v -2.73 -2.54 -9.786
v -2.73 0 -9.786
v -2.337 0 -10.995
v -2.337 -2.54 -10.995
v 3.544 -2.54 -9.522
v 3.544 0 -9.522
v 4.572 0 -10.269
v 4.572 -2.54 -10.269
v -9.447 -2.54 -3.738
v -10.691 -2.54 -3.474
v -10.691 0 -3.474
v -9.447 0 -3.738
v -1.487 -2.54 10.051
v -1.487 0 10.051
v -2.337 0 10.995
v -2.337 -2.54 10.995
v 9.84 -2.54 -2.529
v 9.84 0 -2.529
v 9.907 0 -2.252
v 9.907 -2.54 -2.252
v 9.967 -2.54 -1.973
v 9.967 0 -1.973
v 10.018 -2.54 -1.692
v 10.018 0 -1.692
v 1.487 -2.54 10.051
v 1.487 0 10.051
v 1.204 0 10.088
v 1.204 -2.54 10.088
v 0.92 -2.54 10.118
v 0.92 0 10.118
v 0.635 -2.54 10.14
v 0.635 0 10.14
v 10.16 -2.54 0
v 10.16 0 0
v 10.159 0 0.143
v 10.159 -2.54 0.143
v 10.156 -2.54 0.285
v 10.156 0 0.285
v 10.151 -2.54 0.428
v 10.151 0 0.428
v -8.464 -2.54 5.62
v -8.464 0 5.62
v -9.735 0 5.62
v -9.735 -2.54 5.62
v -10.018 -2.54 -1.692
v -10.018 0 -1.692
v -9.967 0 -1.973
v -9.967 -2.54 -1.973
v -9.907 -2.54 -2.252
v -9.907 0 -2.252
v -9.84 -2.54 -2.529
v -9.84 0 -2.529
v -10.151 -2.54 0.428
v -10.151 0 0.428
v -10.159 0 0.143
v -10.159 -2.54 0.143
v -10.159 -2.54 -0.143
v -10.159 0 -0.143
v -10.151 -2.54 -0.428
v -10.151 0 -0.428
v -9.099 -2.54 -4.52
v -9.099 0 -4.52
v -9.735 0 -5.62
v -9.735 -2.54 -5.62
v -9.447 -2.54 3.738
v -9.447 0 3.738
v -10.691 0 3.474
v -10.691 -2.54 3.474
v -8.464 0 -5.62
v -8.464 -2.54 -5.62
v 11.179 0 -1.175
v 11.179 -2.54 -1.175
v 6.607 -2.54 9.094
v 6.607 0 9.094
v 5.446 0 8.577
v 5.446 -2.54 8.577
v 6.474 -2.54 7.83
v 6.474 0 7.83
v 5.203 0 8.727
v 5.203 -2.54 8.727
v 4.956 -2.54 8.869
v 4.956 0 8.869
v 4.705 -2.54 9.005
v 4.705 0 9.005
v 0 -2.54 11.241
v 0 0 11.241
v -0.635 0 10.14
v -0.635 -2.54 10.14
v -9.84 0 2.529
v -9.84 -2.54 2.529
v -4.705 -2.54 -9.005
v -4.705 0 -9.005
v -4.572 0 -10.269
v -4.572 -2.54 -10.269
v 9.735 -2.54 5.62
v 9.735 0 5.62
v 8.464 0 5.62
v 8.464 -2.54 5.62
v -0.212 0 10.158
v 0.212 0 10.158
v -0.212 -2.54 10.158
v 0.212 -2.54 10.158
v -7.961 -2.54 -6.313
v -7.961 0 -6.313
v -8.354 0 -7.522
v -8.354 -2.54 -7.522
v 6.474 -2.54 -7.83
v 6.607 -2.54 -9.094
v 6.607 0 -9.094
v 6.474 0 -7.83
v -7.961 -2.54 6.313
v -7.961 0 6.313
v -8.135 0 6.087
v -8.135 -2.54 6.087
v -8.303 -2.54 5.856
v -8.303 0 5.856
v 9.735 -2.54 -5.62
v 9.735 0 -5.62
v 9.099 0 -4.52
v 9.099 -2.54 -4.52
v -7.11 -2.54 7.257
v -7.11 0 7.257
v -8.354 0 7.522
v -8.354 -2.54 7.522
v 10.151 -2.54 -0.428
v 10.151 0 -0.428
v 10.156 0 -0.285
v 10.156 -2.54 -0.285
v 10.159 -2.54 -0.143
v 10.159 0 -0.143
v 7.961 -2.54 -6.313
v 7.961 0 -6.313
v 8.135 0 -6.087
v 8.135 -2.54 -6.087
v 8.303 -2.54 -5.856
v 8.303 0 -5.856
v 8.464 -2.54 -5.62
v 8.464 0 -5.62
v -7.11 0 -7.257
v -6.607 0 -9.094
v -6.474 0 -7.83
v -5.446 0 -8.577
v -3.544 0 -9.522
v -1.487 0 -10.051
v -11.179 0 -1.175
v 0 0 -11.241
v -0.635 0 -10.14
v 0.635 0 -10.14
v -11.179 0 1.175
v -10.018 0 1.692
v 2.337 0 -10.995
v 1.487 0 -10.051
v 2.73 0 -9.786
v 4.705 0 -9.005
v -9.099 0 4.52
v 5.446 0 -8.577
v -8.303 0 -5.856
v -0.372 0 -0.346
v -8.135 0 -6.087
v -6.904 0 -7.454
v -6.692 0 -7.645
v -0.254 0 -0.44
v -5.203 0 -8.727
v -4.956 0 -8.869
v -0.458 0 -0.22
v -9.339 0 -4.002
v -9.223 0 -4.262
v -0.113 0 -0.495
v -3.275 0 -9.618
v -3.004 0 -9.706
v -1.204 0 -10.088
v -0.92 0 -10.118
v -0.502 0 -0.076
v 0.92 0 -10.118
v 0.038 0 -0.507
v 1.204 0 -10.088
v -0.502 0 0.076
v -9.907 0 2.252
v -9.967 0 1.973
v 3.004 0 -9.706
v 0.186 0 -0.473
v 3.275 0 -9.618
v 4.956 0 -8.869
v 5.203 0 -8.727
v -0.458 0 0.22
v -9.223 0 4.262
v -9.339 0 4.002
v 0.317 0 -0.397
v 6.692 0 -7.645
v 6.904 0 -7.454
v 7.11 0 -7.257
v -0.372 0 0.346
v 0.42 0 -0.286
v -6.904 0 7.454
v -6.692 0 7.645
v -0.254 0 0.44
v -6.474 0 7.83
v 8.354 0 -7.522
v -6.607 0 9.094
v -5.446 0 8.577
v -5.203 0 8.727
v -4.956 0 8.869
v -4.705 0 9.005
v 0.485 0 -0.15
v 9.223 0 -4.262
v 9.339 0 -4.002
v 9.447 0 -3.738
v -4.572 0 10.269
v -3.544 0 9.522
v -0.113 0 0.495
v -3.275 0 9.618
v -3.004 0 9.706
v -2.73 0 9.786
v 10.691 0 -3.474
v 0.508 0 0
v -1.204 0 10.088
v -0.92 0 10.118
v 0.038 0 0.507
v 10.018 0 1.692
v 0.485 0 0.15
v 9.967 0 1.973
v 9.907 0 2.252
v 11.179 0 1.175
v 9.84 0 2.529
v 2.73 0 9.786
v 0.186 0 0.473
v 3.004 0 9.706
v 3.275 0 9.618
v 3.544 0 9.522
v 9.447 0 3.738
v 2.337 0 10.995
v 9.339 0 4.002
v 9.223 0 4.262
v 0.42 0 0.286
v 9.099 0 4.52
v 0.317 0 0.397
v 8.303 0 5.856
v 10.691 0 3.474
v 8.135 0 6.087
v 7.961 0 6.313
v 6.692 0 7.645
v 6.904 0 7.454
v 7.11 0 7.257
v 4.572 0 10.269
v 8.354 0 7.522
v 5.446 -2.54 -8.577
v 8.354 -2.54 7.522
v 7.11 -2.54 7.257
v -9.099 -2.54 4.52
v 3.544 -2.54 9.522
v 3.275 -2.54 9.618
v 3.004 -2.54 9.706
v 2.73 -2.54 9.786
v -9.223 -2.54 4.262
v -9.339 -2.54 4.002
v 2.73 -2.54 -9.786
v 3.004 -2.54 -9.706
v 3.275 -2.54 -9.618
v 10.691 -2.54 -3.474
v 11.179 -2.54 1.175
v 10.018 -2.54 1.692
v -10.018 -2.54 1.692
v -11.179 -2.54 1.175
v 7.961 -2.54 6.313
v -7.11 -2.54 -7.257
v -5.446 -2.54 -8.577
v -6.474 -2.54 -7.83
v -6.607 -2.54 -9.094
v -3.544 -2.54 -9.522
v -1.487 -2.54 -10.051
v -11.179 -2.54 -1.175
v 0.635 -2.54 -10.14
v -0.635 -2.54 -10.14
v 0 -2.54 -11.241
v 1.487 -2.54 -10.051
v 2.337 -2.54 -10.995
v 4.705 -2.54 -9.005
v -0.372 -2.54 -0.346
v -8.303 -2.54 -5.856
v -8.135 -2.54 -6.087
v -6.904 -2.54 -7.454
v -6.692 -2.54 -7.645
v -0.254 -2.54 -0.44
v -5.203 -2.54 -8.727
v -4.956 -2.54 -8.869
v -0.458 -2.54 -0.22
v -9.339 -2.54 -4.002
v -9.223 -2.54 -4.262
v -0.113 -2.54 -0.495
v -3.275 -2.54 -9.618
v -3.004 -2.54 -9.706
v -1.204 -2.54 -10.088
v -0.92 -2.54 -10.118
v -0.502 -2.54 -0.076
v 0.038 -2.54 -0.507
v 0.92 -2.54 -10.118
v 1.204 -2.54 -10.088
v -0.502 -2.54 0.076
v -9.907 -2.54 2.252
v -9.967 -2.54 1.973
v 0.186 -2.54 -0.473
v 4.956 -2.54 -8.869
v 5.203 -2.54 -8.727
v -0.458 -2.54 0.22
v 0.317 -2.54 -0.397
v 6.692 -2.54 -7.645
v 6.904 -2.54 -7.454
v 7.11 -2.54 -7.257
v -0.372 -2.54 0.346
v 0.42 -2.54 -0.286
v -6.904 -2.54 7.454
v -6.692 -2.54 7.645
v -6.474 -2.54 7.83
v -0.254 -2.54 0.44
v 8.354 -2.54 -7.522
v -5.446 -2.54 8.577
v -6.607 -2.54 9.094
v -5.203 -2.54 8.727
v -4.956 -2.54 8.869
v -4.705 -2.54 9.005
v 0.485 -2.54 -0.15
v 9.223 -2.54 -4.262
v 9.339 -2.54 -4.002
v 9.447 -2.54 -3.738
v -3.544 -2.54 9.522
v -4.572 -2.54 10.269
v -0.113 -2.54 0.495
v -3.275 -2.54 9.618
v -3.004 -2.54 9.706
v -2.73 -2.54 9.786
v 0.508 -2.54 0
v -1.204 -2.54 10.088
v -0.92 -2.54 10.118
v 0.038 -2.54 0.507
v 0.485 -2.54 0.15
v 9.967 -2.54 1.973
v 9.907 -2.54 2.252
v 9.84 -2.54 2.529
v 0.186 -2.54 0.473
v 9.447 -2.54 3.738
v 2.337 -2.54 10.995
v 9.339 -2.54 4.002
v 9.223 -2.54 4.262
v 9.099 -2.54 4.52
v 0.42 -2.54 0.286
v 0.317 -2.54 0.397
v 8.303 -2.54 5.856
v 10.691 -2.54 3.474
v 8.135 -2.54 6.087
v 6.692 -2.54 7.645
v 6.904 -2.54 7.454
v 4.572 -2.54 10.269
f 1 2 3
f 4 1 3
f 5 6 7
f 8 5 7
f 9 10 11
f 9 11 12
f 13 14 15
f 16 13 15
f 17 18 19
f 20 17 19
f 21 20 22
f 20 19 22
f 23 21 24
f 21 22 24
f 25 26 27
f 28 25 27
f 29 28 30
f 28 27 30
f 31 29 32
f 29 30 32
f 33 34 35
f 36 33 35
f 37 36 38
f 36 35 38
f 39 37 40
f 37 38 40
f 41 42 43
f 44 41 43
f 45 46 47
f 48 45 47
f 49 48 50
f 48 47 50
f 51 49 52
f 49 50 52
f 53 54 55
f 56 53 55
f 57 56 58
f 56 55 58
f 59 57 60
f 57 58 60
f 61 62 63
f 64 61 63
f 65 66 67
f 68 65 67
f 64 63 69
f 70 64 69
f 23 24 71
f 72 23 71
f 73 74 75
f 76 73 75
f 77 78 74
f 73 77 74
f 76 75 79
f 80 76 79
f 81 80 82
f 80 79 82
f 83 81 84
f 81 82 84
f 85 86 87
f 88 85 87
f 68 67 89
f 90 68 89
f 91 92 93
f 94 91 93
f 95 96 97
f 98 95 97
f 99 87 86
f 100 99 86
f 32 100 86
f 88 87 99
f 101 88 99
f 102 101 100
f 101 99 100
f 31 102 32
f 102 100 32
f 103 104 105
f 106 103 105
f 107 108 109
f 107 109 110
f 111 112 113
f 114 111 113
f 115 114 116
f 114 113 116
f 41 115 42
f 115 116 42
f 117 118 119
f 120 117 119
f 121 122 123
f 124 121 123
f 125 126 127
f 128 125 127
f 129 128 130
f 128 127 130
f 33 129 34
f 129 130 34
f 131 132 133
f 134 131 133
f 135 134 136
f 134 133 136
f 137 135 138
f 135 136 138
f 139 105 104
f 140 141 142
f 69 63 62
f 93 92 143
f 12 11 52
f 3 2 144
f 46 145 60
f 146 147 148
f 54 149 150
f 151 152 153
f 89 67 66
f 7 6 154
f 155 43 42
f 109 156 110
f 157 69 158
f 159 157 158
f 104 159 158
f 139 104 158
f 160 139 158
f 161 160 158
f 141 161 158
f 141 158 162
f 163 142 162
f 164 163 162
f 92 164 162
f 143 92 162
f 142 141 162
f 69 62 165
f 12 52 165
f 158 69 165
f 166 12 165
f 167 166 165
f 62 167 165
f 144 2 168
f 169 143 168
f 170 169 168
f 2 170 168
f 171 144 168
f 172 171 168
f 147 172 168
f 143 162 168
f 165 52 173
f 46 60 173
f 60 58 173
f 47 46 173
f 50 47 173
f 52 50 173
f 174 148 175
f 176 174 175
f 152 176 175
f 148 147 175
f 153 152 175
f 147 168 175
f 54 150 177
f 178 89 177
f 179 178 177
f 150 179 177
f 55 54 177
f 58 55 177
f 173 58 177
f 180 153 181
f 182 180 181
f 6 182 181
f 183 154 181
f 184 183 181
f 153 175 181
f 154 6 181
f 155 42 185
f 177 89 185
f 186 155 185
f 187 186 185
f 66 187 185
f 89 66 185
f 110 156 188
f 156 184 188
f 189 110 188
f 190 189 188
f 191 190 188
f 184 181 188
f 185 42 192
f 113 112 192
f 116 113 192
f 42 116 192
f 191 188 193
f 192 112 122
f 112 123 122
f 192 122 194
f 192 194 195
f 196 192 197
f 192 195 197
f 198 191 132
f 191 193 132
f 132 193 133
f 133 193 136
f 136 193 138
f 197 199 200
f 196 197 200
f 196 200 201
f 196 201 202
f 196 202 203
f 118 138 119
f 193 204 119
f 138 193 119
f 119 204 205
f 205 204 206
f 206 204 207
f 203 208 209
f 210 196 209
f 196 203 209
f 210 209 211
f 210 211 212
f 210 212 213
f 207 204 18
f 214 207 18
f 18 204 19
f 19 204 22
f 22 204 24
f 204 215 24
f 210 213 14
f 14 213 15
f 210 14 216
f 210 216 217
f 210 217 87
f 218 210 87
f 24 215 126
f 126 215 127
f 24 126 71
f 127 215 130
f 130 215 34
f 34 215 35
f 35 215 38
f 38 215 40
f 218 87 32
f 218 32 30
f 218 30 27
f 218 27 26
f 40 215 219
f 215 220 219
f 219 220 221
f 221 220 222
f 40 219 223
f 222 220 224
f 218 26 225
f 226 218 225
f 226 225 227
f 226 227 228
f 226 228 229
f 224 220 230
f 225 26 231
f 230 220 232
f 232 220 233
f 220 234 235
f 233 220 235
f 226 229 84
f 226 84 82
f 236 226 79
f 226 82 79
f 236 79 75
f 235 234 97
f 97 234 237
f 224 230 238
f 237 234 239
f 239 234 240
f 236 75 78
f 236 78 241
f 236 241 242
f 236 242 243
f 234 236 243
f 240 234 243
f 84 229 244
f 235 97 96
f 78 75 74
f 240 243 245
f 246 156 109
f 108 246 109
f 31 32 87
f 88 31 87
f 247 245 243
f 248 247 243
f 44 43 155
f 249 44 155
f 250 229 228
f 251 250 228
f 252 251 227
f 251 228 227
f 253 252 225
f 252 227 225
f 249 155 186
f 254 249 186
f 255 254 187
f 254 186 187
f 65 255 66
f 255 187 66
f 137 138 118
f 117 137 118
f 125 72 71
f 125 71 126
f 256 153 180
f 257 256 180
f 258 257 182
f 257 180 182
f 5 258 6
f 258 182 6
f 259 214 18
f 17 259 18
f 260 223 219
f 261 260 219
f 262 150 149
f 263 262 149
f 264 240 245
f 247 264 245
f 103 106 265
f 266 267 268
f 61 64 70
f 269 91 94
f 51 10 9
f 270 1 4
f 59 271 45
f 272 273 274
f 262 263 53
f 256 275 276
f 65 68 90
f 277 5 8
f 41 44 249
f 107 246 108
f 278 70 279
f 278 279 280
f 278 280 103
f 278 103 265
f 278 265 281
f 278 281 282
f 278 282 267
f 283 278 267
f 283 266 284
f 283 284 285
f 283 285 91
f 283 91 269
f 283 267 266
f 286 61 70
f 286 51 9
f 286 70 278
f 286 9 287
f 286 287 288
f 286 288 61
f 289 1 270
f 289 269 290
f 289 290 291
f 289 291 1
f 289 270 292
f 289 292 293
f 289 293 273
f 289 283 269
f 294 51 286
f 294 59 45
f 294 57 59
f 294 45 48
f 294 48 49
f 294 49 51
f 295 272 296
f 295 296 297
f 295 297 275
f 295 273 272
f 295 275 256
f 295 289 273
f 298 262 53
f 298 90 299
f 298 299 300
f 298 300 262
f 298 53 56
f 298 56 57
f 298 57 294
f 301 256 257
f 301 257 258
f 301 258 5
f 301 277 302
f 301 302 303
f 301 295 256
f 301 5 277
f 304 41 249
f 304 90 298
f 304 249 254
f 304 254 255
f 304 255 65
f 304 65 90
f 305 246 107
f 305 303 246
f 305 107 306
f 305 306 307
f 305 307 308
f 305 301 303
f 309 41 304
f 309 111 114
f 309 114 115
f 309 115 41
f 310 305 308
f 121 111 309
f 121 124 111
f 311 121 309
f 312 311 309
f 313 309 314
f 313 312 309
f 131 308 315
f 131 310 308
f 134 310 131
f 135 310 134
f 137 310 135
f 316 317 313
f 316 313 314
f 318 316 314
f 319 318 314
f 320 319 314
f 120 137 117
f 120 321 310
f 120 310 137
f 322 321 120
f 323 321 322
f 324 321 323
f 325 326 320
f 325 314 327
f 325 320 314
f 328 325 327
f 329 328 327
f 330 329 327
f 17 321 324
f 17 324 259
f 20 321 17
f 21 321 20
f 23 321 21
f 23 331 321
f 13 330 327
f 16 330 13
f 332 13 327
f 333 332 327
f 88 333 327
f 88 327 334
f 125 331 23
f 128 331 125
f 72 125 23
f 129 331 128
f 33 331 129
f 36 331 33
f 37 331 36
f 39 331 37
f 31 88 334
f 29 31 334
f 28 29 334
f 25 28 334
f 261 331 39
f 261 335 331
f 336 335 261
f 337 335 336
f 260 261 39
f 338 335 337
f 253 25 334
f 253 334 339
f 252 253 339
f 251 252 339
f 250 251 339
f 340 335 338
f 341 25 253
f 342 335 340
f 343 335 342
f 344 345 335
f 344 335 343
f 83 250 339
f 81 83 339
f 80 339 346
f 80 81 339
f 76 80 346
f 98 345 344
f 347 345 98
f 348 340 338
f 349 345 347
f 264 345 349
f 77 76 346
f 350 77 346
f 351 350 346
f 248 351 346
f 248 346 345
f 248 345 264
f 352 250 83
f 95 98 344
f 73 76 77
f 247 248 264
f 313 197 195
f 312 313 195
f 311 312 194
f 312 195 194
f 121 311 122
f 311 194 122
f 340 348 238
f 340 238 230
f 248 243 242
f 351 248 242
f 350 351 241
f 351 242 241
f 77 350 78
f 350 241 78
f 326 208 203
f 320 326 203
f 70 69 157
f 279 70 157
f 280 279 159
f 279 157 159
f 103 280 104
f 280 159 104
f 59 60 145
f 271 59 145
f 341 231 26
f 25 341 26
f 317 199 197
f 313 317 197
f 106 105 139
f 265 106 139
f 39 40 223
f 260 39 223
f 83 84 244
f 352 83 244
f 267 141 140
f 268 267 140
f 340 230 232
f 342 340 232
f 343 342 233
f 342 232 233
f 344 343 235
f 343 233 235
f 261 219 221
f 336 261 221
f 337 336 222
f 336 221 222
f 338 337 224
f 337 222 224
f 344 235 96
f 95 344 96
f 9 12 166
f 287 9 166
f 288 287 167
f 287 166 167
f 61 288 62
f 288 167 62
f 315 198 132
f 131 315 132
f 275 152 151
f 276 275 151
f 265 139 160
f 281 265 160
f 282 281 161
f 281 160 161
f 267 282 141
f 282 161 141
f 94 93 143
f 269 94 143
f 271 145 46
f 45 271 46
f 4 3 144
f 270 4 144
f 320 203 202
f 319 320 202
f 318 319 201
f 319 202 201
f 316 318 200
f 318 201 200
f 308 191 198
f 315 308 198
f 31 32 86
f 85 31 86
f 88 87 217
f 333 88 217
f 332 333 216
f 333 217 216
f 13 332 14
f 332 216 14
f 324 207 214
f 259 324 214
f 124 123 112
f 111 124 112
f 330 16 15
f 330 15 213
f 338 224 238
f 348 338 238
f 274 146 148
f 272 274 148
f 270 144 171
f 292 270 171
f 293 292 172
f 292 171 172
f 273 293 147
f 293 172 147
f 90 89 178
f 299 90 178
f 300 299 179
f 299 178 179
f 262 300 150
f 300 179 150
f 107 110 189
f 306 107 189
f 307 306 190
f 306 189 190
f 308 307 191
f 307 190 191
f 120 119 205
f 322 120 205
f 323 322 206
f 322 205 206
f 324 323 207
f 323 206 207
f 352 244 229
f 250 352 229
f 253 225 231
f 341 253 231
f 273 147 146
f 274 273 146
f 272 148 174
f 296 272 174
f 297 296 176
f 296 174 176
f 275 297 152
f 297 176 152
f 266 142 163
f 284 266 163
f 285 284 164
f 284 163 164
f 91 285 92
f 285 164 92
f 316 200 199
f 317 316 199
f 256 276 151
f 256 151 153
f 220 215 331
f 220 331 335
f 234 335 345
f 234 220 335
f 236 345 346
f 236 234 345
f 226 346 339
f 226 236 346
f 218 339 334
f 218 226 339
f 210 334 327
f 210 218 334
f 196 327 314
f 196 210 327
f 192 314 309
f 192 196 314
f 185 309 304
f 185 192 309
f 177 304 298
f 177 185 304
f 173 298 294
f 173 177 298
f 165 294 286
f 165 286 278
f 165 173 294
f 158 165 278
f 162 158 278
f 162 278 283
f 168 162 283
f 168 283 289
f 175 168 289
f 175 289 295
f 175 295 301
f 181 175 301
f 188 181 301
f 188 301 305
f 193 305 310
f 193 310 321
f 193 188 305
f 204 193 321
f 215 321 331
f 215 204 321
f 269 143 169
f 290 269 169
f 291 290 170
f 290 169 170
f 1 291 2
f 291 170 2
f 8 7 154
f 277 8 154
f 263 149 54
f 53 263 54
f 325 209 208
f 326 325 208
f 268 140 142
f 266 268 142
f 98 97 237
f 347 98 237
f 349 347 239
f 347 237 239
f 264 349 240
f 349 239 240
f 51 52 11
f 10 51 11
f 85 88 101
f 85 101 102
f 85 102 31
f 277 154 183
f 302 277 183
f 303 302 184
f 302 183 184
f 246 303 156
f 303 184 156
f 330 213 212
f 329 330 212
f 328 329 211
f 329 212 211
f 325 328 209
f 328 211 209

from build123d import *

# Parameters (mm, degrees)
F0_R     = 0.508
F1_DEPTH = 2.54


with BuildPart() as f1:
    # F0 (on Front) → F1 (new body)
    with BuildSketch(Plane.XZ):
        with BuildLine():
            ThreePointArc((10.150983, -0.42796), (10.157745, -0.214027), (10.16, 0))
            ThreePointArc((10.16, 0), (10.157745, 0.214027), (10.150983, 0.42796))
            ThreePointArc((10.150983, 0.42796), (10.104342, 1.062009), (10.018137, 1.6919))
            ThreePointArc((10.018137, 1.6919), (9.93798, 2.112383), (9.840182, 2.529116))
            ThreePointArc((9.840182, 2.529116), (9.662734, 3.139613), (9.447451, 3.737816))
            ThreePointArc((9.447451, 3.737816), (9.281622, 4.132444), (9.099317, 4.519737))
            ThreePointArc((9.099317, 4.519737), (8.798818, 5.08), (8.463866, 5.620371))
            ThreePointArc((8.463866, 5.620371), (8.219613, 5.971898), (7.960769, 6.312825))
            ThreePointArc((7.960769, 6.312825), (7.550351, 6.798367), (7.110369, 7.257289))
            ThreePointArc((7.110369, 7.257289), (6.798367, 7.550351), (6.474297, 7.830011))
            ThreePointArc((6.474297, 7.830011), (5.971898, 8.219613), (5.446115, 8.577029))
            ThreePointArc((5.446115, 8.577029), (5.08, 8.798818), (4.704867, 9.004989))
            ThreePointArc((4.704867, 9.004989), (4.132444, 9.281622), (3.54384, 9.521911))
            ThreePointArc((3.54384, 9.521911), (3.139613, 9.662734), (2.729812, 9.786405))
            ThreePointArc((2.729812, 9.786405), (2.112383, 9.93798), (1.486682, 10.050641))
            ThreePointArc((1.486682, 10.050641), (1.062009, 10.104342), (0.635451, 10.140109))
            Line((0.635451, 10.140109), (-0.635451, 10.140109))
            ThreePointArc((-0.635451, 10.140109), (-1.062009, 10.104342), (-1.486682, 10.050641))
            ThreePointArc((-1.486682, 10.050641), (-2.112383, 9.93798), (-2.729812, 9.786405))
            ThreePointArc((-2.729812, 9.786405), (-3.139613, 9.662734), (-3.54384, 9.521911))
            ThreePointArc((-3.54384, 9.521911), (-4.132444, 9.281622), (-4.704867, 9.004989))
            ThreePointArc((-4.704867, 9.004989), (-5.08, 8.798818), (-5.446115, 8.577029))
            ThreePointArc((-5.446115, 8.577029), (-5.971898, 8.219613), (-6.474297, 7.830011))
            ThreePointArc((-6.474297, 7.830011), (-6.798367, 7.550351), (-7.110369, 7.257289))
            ThreePointArc((-7.110369, 7.257289), (-7.550351, 6.798367), (-7.960769, 6.312825))
            ThreePointArc((-7.960769, 6.312825), (-8.219613, 5.971898), (-8.463866, 5.620371))
            ThreePointArc((-8.463866, 5.620371), (-8.798818, 5.08), (-9.099317, 4.519737))
            ThreePointArc((-9.099317, 4.519737), (-9.281622, 4.132444), (-9.447451, 3.737816))
            ThreePointArc((-9.447451, 3.737816), (-9.662734, 3.139613), (-9.840182, 2.529116))
            ThreePointArc((-9.840182, 2.529116), (-9.93798, 2.112383), (-10.018137, 1.6919))
            ThreePointArc((-10.018137, 1.6919), (-10.104342, 1.062009), (-10.150983, 0.42796))
            ThreePointArc((-10.150983, 0.42796), (-10.16, 0), (-10.150983, -0.42796))
            ThreePointArc((-10.150983, -0.42796), (-10.104342, -1.062009), (-10.018137, -1.6919))
            ThreePointArc((-10.018137, -1.6919), (-9.93798, -2.112383), (-9.840182, -2.529116))
            ThreePointArc((-9.840182, -2.529116), (-9.662734, -3.139613), (-9.447451, -3.737816))
            ThreePointArc((-9.447451, -3.737816), (-9.281622, -4.132444), (-9.099317, -4.519737))
            ThreePointArc((-9.099317, -4.519737), (-8.798818, -5.08), (-8.463866, -5.620371))
            ThreePointArc((-8.463866, -5.620371), (-8.219613, -5.971898), (-7.960769, -6.312825))
            ThreePointArc((-7.960769, -6.312825), (-7.550351, -6.798367), (-7.110369, -7.257289))
            ThreePointArc((-7.110369, -7.257289), (-6.798367, -7.550351), (-6.474297, -7.830011))
            ThreePointArc((-6.474297, -7.830011), (-5.971898, -8.219613), (-5.446115, -8.577029))
            ThreePointArc((-5.446115, -8.577029), (-5.08, -8.798818), (-4.704867, -9.004989))
            ThreePointArc((-4.704867, -9.004989), (-4.132444, -9.281622), (-3.54384, -9.521911))
            ThreePointArc((-3.54384, -9.521911), (-3.139613, -9.662734), (-2.729812, -9.786405))
            ThreePointArc((-2.729812, -9.786405), (-2.112383, -9.93798), (-1.486682, -10.050641))
            ThreePointArc((-1.486682, -10.050641), (-1.062009, -10.104342), (-0.635451, -10.140109))
            ThreePointArc((-0.635451, -10.140109), (0, -10.16), (0.635451, -10.140109))
            ThreePointArc((0.635451, -10.140109), (1.062009, -10.104342), (1.486682, -10.050641))
            ThreePointArc((1.486682, -10.050641), (2.112383, -9.93798), (2.729812, -9.786405))
            ThreePointArc((2.729812, -9.786405), (3.139613, -9.662734), (3.54384, -9.521911))
            ThreePointArc((3.54384, -9.521911), (4.132444, -9.281622), (4.704867, -9.004989))
            ThreePointArc((4.704867, -9.004989), (5.08, -8.798818), (5.446115, -8.577029))
            ThreePointArc((5.446115, -8.577029), (5.971898, -8.219613), (6.474297, -7.830011))
            ThreePointArc((6.474297, -7.830011), (6.798367, -7.550351), (7.110369, -7.257289))
            ThreePointArc((7.110369, -7.257289), (7.550351, -6.798367), (7.960769, -6.312825))
            ThreePointArc((7.960769, -6.312825), (8.219613, -5.971898), (8.463866, -5.620371))
            ThreePointArc((8.463866, -5.620371), (8.798818, -5.08), (9.099317, -4.519737))
            ThreePointArc((9.099317, -4.519737), (9.281622, -4.132444), (9.447451, -3.737816))
            ThreePointArc((9.447451, -3.737816), (9.662734, -3.139613), (9.840182, -2.529116))
            ThreePointArc((9.840182, -2.529116), (9.93798, -2.112383), (10.018137, -1.6919))
            ThreePointArc((10.018137, -1.6919), (10.104342, -1.062009), (10.150983, -0.42796))
        make_face()
        Circle(F0_R, mode=Mode.SUBTRACT)
        with BuildLine():
            ThreePointArc((-9.840182, 2.529116), (-9.662734, 3.139613), (-9.447451, 3.737816))
            Line((-9.447451, 3.737816), (-10.690581, 3.47358))
            Line((-10.690581, 3.47358), (-9.840182, 2.529116))
        make_face()
        with BuildLine():
            ThreePointArc((-9.099317, 4.519737), (-8.798818, 5.08), (-8.463866, 5.620371))
            Line((-8.463866, 5.620371), (-9.734769, 5.620371))
            Line((-9.734769, 5.620371), (-9.099317, 4.519737))
        make_face()
        with BuildLine():
            ThreePointArc((-7.960769, 6.312825), (-7.550351, 6.798367), (-7.110369, 7.257289))
            Line((-7.110369, 7.257289), (-8.3535, 7.521525))
            Line((-8.3535, 7.521525), (-7.960769, 6.312825))
        make_face()
        with BuildLine():
            ThreePointArc((-6.474297, 7.830011), (-5.971898, 8.219613), (-5.446115, 8.577029))
            Line((-5.446115, 8.577029), (-6.607143, 9.093952))
            Line((-6.607143, 9.093952), (-6.474297, 7.830011))
        make_face()
        with BuildLine():
            ThreePointArc((-4.704867, 9.004989), (-4.132444, 9.281622), (-3.54384, 9.521911))
            Line((-3.54384, 9.521911), (-4.572022, 10.268929))
            Line((-4.572022, 10.268929), (-4.704867, 9.004989))
        make_face()
        with BuildLine():
            ThreePointArc((-2.729812, 9.786405), (-2.112383, 9.93798), (-1.486682, 10.050641))
            Line((-1.486682, 10.050641), (-2.337082, 10.995105))
            Line((-2.337082, 10.995105), (-2.729812, 9.786405))
        make_face()
        with BuildLine():
            ThreePointArc((-0.635451, 10.140109), (0, 10.16), (0.635451, 10.140109))
            Line((0.635451, 10.140109), (0, 11.240743))
            Line((0, 11.240743), (-0.635451, 10.140109))
        make_face()
        with BuildLine():
            ThreePointArc((1.486682, 10.050641), (2.112383, 9.93798), (2.729812, 9.786405))
            Line((2.729812, 9.786405), (2.337082, 10.995105))
            Line((2.337082, 10.995105), (1.486682, 10.050641))
        make_face()
        with BuildLine():
            ThreePointArc((3.54384, 9.521911), (4.132444, 9.281622), (4.704867, 9.004989))
            Line((4.704867, 9.004989), (4.572022, 10.268929))
            Line((4.572022, 10.268929), (3.54384, 9.521911))
        make_face()
        with BuildLine():
            ThreePointArc((5.446115, 8.577029), (5.971898, 8.219613), (6.474297, 7.830011))
            Line((6.474297, 7.830011), (6.607143, 9.093952))
            Line((6.607143, 9.093952), (5.446115, 8.577029))
        make_face()
        with BuildLine():
            ThreePointArc((7.110369, 7.257289), (7.550351, 6.798367), (7.960769, 6.312825))
            Line((7.960769, 6.312825), (8.3535, 7.521525))
            Line((8.3535, 7.521525), (7.110369, 7.257289))
        make_face()
        with BuildLine():
            ThreePointArc((8.463866, 5.620371), (8.798818, 5.08), (9.099317, 4.519737))
            Line((9.099317, 4.519737), (9.734769, 5.620371))
            Line((9.734769, 5.620371), (8.463866, 5.620371))
        make_face()
        with BuildLine():
            ThreePointArc((9.447451, 3.737816), (9.662734, 3.139613), (9.840182, 2.529116))
            Line((9.840182, 2.529116), (10.690581, 3.47358))
            Line((10.690581, 3.47358), (9.447451, 3.737816))
        make_face()
        with BuildLine():
            ThreePointArc((10.018137, 1.6919), (10.104342, 1.062009), (10.150983, 0.42796))
            Line((10.150983, 0.42796), (11.179165, 1.174978))
            Line((11.179165, 1.174978), (10.018137, 1.6919))
        make_face()
        with BuildLine():
            Line((11.179165, -1.174978), (10.150983, -0.42796))
            ThreePointArc((10.150983, -0.42796), (10.104342, -1.062009), (10.018137, -1.6919))
            Line((10.018137, -1.6919), (11.179165, -1.174978))
        make_face()
        with BuildLine():
            Line((10.690581, -3.47358), (9.840182, -2.529116))
            ThreePointArc((9.840182, -2.529116), (9.662734, -3.139613), (9.447451, -3.737816))
            Line((9.447451, -3.737816), (10.690581, -3.47358))
        make_face()
        with BuildLine():
            Line((9.734769, -5.620371), (9.099317, -4.519737))
            ThreePointArc((9.099317, -4.519737), (8.798818, -5.08), (8.463866, -5.620371))
            Line((8.463866, -5.620371), (9.734769, -5.620371))
        make_face()
        with BuildLine():
            Line((8.3535, -7.521525), (7.960769, -6.312825))
            ThreePointArc((7.960769, -6.312825), (7.550351, -6.798367), (7.110369, -7.257289))
            Line((7.110369, -7.257289), (8.3535, -7.521525))
        make_face()
        with BuildLine():
            Line((6.607143, -9.093952), (6.474297, -7.830011))
            ThreePointArc((6.474297, -7.830011), (5.971898, -8.219613), (5.446115, -8.577029))
            Line((5.446115, -8.577029), (6.607143, -9.093952))
        make_face()
        with BuildLine():
            Line((4.572022, -10.268929), (4.704867, -9.004989))
            ThreePointArc((4.704867, -9.004989), (4.132444, -9.281622), (3.54384, -9.521911))
            Line((3.54384, -9.521911), (4.572022, -10.268929))
        make_face()
        with BuildLine():
            Line((2.337082, -10.995105), (2.729812, -9.786405))
            ThreePointArc((2.729812, -9.786405), (2.112383, -9.93798), (1.486682, -10.050641))
            Line((1.486682, -10.050641), (2.337082, -10.995105))
        make_face()
        with BuildLine():
            Line((0, -11.240743), (0.635451, -10.140109))
            ThreePointArc((0.635451, -10.140109), (0, -10.16), (-0.635451, -10.140109))
            Line((-0.635451, -10.140109), (0, -11.240743))
        make_face()
        with BuildLine():
            Line((-2.337082, -10.995105), (-1.486682, -10.050641))
            ThreePointArc((-1.486682, -10.050641), (-2.112383, -9.93798), (-2.729812, -9.786405))
            Line((-2.729812, -9.786405), (-2.337082, -10.995105))
        make_face()
        with BuildLine():
            Line((-4.572022, -10.268929), (-3.54384, -9.521911))
            ThreePointArc((-3.54384, -9.521911), (-4.132444, -9.281622), (-4.704867, -9.004989))
            Line((-4.704867, -9.004989), (-4.572022, -10.268929))
        make_face()
        with BuildLine():
            Line((-6.607143, -9.093952), (-5.446115, -8.577029))
            ThreePointArc((-5.446115, -8.577029), (-5.971898, -8.219613), (-6.474297, -7.830011))
            Line((-6.474297, -7.830011), (-6.607143, -9.093952))
        make_face()
        with BuildLine():
            Line((-8.3535, -7.521525), (-7.110369, -7.257289))
            ThreePointArc((-7.110369, -7.257289), (-7.550351, -6.798367), (-7.960769, -6.312825))
            Line((-7.960769, -6.312825), (-8.3535, -7.521525))
        make_face()
        with BuildLine():
            Line((-9.734769, -5.620371), (-8.463866, -5.620371))
            ThreePointArc((-8.463866, -5.620371), (-8.798818, -5.08), (-9.099317, -4.519737))
            Line((-9.099317, -4.519737), (-9.734769, -5.620371))
        make_face()
        with BuildLine():
            Line((-10.690581, -3.47358), (-9.447451, -3.737816))
            ThreePointArc((-9.447451, -3.737816), (-9.662734, -3.139613), (-9.840182, -2.529116))
            Line((-9.840182, -2.529116), (-10.690581, -3.47358))
        make_face()
        with BuildLine():
            Line((-11.179165, -1.174978), (-10.018137, -1.6919))
            ThreePointArc((-10.018137, -1.6919), (-10.104342, -1.062009), (-10.150983, -0.42796))
            Line((-10.150983, -0.42796), (-11.179165, -1.174978))
        make_face()
        with BuildLine():
            ThreePointArc((-10.150983, 0.42796), (-10.104342, 1.062009), (-10.018137, 1.6919))
            Line((-10.018137, 1.6919), (-11.179165, 1.174978))
            Line((-11.179165, 1.174978), (-10.150983, 0.42796))
        make_face()
    extrude(amount=F1_DEPTH)


solid = f1.part
